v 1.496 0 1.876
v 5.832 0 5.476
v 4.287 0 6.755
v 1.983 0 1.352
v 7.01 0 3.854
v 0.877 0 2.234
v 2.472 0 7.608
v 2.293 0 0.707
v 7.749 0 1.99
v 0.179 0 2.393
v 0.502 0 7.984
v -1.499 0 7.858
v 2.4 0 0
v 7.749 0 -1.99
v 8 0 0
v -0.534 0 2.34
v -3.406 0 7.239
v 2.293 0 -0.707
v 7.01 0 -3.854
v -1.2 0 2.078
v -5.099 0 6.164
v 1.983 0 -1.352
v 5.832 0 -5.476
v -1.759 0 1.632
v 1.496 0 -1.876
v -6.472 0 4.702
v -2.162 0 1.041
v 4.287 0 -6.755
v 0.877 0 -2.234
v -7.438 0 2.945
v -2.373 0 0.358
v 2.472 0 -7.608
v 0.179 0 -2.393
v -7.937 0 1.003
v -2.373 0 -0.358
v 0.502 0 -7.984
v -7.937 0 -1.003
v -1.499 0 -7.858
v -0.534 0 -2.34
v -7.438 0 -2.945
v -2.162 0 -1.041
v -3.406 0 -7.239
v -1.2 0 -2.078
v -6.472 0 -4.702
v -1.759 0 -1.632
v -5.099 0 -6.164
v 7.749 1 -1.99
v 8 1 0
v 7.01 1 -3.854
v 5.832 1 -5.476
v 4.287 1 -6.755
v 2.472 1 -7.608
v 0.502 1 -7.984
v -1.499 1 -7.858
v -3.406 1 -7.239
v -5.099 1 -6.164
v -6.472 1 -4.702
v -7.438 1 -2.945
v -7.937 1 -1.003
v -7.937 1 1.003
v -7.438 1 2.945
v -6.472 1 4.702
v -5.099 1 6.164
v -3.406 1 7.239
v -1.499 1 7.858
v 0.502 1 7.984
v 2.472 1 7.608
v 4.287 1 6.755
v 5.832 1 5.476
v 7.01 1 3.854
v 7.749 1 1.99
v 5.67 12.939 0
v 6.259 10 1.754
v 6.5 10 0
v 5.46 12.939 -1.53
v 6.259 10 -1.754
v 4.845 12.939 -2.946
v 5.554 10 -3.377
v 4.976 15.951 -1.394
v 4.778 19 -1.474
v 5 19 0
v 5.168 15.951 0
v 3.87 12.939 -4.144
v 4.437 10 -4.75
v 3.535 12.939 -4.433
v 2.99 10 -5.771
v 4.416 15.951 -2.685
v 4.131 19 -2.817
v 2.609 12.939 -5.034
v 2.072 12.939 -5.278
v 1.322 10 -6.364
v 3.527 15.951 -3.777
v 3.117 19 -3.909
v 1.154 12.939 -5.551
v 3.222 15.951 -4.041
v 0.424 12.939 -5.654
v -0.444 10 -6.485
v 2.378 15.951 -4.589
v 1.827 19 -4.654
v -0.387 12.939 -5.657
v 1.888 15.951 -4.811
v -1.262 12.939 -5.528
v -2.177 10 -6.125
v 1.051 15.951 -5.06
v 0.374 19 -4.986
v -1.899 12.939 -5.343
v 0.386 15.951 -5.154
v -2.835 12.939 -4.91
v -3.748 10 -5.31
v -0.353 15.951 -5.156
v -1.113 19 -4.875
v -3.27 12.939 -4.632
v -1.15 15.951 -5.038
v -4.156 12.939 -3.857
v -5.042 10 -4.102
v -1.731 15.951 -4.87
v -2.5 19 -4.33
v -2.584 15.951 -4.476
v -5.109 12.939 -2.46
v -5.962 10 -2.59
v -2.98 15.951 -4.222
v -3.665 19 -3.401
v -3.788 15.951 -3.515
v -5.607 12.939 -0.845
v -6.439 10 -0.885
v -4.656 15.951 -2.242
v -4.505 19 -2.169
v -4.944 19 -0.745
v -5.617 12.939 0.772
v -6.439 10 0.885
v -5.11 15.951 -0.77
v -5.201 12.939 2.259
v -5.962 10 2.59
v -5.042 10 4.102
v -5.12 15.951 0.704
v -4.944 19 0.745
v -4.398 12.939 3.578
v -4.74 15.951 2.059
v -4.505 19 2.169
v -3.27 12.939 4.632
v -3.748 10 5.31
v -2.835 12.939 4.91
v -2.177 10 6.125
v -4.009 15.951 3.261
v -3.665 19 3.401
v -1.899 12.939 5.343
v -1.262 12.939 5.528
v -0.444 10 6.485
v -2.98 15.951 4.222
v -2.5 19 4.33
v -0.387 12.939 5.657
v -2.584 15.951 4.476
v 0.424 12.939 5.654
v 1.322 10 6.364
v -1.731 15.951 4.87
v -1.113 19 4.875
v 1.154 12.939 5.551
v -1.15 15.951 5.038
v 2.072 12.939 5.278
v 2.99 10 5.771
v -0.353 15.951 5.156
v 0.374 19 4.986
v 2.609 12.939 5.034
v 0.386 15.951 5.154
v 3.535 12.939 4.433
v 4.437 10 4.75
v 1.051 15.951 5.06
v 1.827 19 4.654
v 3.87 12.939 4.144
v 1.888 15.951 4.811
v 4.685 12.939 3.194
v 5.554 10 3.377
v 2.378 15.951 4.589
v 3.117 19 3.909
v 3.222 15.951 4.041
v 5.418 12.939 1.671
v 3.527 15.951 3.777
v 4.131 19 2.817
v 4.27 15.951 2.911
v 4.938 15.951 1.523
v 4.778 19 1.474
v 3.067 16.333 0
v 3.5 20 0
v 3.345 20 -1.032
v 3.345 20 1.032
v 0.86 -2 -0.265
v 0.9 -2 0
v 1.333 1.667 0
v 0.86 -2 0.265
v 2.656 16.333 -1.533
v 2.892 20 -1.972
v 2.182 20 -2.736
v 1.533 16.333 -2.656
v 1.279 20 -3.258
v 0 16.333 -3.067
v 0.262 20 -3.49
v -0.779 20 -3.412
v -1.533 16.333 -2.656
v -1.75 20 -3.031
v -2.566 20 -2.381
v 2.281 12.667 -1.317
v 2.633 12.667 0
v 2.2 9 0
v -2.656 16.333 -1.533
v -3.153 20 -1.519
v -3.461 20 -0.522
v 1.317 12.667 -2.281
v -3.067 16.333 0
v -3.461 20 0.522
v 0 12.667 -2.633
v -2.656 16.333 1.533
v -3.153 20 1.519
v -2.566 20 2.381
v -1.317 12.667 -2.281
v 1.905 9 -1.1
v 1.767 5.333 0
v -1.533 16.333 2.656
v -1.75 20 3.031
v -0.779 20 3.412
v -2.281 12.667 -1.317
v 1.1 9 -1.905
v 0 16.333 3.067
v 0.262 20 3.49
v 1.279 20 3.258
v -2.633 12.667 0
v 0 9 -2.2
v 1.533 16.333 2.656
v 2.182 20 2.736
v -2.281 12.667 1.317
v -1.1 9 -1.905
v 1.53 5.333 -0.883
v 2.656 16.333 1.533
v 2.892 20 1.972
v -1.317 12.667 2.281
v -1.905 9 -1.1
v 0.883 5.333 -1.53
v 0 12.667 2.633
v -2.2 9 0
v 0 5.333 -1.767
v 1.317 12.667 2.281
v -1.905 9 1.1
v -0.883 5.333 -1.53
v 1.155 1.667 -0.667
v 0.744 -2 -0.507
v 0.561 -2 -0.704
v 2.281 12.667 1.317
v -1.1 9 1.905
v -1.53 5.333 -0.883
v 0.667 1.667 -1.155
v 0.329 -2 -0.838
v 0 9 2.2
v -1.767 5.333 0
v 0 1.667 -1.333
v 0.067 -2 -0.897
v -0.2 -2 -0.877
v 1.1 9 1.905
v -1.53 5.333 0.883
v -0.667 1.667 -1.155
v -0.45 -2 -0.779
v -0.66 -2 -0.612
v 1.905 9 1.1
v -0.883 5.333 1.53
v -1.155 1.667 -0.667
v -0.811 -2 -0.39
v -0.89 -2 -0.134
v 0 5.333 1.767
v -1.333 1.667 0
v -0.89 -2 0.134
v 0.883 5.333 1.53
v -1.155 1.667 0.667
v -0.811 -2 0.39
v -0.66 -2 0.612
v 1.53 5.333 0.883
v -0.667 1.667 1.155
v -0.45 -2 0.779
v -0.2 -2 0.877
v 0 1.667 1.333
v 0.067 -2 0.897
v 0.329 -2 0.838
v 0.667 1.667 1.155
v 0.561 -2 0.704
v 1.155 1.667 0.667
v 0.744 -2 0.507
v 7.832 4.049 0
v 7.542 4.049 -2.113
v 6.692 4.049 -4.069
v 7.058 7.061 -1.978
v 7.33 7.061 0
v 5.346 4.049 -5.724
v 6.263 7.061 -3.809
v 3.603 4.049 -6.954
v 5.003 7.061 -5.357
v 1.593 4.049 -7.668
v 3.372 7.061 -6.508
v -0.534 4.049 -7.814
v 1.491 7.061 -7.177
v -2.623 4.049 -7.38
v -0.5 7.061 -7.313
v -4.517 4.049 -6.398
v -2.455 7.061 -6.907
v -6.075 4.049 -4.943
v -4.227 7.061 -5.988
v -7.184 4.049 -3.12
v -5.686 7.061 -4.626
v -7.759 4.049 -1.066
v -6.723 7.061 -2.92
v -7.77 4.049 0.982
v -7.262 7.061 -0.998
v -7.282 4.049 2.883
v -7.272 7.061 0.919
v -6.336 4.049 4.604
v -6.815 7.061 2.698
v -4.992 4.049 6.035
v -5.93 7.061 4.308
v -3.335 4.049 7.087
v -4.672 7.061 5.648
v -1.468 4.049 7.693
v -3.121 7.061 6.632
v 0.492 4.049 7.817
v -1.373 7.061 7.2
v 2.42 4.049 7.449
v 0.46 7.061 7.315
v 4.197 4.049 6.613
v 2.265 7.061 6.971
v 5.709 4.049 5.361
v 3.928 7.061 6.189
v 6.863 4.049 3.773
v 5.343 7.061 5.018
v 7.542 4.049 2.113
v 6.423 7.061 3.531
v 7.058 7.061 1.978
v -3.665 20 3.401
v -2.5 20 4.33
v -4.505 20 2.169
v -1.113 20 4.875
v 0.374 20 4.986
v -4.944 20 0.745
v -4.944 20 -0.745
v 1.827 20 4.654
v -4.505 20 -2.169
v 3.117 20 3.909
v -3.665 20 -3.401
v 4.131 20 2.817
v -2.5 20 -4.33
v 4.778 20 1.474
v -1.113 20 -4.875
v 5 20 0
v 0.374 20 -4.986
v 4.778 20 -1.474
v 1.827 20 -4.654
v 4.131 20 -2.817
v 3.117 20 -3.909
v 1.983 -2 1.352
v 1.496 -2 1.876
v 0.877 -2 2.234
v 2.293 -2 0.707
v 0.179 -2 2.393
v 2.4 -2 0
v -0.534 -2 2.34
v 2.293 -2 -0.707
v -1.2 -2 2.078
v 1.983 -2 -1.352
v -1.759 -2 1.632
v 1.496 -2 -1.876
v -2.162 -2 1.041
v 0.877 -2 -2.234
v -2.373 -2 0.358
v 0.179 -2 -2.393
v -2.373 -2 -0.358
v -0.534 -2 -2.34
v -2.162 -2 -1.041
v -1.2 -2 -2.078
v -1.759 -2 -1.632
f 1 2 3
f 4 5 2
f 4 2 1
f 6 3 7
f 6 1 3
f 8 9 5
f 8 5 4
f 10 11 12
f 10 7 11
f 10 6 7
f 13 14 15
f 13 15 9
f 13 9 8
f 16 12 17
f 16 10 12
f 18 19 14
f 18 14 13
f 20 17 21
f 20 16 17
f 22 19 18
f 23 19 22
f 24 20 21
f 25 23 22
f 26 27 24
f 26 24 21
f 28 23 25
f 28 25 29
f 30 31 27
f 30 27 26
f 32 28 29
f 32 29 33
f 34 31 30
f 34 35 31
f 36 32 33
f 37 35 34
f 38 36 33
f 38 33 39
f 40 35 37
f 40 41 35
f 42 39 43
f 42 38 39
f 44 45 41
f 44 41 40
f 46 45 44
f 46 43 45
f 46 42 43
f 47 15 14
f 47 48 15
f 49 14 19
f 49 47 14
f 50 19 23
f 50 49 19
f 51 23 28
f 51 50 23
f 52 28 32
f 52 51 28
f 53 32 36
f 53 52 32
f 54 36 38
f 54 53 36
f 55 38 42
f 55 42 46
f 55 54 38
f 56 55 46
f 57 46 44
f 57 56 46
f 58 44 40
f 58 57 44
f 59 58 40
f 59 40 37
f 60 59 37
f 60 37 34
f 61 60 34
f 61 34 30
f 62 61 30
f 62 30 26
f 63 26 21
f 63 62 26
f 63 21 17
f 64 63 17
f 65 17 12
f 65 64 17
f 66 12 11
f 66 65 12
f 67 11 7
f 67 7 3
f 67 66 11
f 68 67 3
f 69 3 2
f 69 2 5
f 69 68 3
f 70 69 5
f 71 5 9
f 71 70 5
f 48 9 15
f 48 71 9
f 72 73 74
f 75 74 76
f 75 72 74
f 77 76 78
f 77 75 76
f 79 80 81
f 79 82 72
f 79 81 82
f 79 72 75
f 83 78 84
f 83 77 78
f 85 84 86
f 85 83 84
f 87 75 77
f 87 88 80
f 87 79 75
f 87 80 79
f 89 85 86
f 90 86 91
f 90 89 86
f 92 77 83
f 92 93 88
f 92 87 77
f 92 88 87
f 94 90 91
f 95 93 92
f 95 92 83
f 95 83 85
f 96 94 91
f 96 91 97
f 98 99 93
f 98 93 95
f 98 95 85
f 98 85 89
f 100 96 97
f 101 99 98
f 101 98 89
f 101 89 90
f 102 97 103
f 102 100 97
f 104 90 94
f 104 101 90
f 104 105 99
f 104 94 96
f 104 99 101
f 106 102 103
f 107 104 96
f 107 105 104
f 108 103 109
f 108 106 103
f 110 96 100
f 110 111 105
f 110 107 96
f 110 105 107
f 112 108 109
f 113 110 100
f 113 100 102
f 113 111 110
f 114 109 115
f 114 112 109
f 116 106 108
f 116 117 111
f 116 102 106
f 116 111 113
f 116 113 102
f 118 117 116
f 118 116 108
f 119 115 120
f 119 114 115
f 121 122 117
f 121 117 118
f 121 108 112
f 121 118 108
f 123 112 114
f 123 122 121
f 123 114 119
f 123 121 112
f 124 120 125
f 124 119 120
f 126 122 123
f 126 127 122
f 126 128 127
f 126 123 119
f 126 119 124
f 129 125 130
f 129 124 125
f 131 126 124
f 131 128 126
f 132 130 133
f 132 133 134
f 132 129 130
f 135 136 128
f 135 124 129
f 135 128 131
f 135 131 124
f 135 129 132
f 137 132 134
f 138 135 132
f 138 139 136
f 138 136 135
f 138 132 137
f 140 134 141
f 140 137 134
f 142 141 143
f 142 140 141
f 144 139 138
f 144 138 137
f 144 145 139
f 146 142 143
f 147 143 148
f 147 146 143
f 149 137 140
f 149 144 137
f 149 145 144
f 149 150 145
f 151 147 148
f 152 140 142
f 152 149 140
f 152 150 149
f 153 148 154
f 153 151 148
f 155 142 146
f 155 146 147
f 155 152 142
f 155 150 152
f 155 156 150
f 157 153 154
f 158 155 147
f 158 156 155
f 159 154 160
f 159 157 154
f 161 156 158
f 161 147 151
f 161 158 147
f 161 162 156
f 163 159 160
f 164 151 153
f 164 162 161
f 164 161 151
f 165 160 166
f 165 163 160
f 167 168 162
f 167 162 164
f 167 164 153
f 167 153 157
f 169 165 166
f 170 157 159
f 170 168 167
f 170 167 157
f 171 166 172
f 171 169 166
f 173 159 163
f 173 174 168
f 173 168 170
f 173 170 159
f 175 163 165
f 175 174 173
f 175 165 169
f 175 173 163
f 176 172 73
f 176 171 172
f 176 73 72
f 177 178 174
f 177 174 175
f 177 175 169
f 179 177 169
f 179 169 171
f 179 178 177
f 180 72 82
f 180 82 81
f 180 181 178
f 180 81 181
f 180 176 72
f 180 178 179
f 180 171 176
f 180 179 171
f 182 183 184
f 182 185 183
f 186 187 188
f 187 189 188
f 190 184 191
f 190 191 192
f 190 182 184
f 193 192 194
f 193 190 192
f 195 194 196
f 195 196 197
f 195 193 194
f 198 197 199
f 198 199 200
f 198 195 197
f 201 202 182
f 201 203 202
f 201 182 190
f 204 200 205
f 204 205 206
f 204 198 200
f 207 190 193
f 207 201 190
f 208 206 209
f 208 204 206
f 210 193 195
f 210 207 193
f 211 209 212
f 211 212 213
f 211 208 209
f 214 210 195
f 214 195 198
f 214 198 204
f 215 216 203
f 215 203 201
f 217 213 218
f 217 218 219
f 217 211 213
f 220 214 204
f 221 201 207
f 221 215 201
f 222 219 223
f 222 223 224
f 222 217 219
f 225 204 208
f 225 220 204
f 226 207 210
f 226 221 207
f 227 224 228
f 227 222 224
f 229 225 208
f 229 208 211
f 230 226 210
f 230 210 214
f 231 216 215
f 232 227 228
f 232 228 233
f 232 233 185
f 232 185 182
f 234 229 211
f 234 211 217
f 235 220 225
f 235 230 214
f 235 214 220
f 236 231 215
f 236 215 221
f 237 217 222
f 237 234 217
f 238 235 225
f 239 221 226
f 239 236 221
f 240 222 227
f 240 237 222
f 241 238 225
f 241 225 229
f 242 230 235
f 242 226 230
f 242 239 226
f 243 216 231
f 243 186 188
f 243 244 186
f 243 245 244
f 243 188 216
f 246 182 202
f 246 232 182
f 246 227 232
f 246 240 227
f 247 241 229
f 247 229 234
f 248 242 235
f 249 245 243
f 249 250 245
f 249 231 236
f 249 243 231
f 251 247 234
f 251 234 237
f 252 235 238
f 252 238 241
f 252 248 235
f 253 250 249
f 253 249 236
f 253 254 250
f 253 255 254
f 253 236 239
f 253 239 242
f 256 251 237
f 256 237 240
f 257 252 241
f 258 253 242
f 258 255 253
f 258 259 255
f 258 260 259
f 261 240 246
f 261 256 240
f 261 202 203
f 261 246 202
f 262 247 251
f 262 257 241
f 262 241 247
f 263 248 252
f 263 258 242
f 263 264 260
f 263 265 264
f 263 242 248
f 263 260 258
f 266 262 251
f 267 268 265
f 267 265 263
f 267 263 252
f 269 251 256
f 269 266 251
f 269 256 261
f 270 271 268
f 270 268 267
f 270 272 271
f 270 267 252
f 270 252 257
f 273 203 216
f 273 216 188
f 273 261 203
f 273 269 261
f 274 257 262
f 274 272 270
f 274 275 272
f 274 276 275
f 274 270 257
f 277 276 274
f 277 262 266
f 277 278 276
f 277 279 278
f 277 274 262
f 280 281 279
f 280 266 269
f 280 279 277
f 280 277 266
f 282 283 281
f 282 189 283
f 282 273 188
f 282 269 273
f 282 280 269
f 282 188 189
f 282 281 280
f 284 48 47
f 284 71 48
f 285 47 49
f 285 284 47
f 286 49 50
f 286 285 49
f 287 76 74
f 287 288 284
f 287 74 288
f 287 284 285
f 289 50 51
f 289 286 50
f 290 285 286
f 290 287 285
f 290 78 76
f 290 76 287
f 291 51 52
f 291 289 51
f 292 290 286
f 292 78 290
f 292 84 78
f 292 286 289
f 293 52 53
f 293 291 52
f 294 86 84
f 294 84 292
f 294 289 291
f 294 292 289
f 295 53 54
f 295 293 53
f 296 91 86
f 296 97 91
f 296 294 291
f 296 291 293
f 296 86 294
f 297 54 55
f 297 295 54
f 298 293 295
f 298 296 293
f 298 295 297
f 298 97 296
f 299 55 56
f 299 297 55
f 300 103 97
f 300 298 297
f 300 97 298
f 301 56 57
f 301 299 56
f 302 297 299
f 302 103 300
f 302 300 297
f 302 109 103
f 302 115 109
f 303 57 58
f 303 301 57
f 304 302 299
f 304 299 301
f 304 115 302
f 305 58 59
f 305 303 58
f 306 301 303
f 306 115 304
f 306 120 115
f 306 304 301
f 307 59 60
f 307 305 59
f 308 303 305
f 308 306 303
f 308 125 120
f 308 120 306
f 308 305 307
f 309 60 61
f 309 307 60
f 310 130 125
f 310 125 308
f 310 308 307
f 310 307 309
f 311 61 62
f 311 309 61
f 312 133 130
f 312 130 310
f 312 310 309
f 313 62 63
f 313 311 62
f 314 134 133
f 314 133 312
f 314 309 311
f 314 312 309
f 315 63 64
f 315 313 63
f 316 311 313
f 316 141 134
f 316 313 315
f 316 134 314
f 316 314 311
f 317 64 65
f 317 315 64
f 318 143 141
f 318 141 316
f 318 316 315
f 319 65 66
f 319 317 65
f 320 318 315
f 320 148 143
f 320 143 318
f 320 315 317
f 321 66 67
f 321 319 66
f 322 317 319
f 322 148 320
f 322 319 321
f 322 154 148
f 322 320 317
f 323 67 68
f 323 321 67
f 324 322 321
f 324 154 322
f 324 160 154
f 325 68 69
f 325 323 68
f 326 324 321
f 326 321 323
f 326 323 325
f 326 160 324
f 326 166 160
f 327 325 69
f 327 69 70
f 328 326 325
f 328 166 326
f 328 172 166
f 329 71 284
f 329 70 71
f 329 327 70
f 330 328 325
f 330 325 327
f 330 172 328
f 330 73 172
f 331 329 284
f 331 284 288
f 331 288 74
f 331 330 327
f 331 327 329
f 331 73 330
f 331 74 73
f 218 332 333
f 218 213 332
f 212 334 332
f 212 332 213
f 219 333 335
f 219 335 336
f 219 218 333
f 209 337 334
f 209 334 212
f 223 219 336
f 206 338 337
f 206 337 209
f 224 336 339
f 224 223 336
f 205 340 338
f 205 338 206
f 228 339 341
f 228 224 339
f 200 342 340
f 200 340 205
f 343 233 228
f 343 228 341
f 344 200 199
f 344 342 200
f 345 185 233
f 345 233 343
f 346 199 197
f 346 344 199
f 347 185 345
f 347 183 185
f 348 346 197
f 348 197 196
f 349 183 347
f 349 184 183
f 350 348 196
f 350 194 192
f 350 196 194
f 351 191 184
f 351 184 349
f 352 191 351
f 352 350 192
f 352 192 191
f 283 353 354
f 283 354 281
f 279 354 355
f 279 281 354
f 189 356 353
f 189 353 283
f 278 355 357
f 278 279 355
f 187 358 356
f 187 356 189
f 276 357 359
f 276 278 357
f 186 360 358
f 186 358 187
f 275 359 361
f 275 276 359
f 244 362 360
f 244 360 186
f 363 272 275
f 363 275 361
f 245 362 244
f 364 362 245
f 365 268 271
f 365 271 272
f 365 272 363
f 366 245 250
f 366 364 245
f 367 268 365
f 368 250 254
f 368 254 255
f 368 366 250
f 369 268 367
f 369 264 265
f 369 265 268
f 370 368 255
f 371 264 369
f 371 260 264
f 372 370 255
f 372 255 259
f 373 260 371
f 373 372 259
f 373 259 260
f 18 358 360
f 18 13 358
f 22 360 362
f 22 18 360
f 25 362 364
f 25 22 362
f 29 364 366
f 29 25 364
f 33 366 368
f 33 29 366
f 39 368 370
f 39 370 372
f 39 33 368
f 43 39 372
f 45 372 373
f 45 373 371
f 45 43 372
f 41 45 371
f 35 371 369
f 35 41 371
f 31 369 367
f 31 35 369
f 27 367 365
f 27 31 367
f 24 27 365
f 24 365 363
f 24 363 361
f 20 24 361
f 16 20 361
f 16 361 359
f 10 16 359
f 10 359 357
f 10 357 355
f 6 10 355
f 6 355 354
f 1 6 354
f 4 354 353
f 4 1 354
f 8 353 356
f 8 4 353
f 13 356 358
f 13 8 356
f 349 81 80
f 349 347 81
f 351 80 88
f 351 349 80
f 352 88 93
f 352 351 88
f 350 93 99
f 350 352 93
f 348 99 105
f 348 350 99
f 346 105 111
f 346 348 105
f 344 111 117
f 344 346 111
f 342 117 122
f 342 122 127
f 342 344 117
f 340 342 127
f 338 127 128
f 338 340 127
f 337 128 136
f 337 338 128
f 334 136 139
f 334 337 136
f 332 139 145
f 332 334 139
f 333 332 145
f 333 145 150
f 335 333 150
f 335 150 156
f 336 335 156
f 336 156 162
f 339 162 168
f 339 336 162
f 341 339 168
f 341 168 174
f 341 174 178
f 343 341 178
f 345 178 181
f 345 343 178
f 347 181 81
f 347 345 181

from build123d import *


with BuildPart() as part:
    # Sketch1 → Revolve1 (revolve)
    with BuildSketch(Plane.XY):
        with BuildLine():
            Line((2.4, -2), (2.4, 0))
            Line((2.4, 0), (8, 0))
            Line((8, 0), (8, 1))
            ThreePointArc((8, 1), (7.622431386, 5.562071898), (6.5, 10))
            ThreePointArc((6.5, 10), (5.377568614, 14.437928102), (5, 19))
            Line((5, 19), (5, 20))
            Line((5, 20), (3.5, 20))
            Line((3.5, 20), (0.9, -2))
            Line((0.9, -2), (2.4, -2))
        make_face()
    revolve(axis=Axis((0, 0, 0), (0, 1, 0)))


solid = part.part
